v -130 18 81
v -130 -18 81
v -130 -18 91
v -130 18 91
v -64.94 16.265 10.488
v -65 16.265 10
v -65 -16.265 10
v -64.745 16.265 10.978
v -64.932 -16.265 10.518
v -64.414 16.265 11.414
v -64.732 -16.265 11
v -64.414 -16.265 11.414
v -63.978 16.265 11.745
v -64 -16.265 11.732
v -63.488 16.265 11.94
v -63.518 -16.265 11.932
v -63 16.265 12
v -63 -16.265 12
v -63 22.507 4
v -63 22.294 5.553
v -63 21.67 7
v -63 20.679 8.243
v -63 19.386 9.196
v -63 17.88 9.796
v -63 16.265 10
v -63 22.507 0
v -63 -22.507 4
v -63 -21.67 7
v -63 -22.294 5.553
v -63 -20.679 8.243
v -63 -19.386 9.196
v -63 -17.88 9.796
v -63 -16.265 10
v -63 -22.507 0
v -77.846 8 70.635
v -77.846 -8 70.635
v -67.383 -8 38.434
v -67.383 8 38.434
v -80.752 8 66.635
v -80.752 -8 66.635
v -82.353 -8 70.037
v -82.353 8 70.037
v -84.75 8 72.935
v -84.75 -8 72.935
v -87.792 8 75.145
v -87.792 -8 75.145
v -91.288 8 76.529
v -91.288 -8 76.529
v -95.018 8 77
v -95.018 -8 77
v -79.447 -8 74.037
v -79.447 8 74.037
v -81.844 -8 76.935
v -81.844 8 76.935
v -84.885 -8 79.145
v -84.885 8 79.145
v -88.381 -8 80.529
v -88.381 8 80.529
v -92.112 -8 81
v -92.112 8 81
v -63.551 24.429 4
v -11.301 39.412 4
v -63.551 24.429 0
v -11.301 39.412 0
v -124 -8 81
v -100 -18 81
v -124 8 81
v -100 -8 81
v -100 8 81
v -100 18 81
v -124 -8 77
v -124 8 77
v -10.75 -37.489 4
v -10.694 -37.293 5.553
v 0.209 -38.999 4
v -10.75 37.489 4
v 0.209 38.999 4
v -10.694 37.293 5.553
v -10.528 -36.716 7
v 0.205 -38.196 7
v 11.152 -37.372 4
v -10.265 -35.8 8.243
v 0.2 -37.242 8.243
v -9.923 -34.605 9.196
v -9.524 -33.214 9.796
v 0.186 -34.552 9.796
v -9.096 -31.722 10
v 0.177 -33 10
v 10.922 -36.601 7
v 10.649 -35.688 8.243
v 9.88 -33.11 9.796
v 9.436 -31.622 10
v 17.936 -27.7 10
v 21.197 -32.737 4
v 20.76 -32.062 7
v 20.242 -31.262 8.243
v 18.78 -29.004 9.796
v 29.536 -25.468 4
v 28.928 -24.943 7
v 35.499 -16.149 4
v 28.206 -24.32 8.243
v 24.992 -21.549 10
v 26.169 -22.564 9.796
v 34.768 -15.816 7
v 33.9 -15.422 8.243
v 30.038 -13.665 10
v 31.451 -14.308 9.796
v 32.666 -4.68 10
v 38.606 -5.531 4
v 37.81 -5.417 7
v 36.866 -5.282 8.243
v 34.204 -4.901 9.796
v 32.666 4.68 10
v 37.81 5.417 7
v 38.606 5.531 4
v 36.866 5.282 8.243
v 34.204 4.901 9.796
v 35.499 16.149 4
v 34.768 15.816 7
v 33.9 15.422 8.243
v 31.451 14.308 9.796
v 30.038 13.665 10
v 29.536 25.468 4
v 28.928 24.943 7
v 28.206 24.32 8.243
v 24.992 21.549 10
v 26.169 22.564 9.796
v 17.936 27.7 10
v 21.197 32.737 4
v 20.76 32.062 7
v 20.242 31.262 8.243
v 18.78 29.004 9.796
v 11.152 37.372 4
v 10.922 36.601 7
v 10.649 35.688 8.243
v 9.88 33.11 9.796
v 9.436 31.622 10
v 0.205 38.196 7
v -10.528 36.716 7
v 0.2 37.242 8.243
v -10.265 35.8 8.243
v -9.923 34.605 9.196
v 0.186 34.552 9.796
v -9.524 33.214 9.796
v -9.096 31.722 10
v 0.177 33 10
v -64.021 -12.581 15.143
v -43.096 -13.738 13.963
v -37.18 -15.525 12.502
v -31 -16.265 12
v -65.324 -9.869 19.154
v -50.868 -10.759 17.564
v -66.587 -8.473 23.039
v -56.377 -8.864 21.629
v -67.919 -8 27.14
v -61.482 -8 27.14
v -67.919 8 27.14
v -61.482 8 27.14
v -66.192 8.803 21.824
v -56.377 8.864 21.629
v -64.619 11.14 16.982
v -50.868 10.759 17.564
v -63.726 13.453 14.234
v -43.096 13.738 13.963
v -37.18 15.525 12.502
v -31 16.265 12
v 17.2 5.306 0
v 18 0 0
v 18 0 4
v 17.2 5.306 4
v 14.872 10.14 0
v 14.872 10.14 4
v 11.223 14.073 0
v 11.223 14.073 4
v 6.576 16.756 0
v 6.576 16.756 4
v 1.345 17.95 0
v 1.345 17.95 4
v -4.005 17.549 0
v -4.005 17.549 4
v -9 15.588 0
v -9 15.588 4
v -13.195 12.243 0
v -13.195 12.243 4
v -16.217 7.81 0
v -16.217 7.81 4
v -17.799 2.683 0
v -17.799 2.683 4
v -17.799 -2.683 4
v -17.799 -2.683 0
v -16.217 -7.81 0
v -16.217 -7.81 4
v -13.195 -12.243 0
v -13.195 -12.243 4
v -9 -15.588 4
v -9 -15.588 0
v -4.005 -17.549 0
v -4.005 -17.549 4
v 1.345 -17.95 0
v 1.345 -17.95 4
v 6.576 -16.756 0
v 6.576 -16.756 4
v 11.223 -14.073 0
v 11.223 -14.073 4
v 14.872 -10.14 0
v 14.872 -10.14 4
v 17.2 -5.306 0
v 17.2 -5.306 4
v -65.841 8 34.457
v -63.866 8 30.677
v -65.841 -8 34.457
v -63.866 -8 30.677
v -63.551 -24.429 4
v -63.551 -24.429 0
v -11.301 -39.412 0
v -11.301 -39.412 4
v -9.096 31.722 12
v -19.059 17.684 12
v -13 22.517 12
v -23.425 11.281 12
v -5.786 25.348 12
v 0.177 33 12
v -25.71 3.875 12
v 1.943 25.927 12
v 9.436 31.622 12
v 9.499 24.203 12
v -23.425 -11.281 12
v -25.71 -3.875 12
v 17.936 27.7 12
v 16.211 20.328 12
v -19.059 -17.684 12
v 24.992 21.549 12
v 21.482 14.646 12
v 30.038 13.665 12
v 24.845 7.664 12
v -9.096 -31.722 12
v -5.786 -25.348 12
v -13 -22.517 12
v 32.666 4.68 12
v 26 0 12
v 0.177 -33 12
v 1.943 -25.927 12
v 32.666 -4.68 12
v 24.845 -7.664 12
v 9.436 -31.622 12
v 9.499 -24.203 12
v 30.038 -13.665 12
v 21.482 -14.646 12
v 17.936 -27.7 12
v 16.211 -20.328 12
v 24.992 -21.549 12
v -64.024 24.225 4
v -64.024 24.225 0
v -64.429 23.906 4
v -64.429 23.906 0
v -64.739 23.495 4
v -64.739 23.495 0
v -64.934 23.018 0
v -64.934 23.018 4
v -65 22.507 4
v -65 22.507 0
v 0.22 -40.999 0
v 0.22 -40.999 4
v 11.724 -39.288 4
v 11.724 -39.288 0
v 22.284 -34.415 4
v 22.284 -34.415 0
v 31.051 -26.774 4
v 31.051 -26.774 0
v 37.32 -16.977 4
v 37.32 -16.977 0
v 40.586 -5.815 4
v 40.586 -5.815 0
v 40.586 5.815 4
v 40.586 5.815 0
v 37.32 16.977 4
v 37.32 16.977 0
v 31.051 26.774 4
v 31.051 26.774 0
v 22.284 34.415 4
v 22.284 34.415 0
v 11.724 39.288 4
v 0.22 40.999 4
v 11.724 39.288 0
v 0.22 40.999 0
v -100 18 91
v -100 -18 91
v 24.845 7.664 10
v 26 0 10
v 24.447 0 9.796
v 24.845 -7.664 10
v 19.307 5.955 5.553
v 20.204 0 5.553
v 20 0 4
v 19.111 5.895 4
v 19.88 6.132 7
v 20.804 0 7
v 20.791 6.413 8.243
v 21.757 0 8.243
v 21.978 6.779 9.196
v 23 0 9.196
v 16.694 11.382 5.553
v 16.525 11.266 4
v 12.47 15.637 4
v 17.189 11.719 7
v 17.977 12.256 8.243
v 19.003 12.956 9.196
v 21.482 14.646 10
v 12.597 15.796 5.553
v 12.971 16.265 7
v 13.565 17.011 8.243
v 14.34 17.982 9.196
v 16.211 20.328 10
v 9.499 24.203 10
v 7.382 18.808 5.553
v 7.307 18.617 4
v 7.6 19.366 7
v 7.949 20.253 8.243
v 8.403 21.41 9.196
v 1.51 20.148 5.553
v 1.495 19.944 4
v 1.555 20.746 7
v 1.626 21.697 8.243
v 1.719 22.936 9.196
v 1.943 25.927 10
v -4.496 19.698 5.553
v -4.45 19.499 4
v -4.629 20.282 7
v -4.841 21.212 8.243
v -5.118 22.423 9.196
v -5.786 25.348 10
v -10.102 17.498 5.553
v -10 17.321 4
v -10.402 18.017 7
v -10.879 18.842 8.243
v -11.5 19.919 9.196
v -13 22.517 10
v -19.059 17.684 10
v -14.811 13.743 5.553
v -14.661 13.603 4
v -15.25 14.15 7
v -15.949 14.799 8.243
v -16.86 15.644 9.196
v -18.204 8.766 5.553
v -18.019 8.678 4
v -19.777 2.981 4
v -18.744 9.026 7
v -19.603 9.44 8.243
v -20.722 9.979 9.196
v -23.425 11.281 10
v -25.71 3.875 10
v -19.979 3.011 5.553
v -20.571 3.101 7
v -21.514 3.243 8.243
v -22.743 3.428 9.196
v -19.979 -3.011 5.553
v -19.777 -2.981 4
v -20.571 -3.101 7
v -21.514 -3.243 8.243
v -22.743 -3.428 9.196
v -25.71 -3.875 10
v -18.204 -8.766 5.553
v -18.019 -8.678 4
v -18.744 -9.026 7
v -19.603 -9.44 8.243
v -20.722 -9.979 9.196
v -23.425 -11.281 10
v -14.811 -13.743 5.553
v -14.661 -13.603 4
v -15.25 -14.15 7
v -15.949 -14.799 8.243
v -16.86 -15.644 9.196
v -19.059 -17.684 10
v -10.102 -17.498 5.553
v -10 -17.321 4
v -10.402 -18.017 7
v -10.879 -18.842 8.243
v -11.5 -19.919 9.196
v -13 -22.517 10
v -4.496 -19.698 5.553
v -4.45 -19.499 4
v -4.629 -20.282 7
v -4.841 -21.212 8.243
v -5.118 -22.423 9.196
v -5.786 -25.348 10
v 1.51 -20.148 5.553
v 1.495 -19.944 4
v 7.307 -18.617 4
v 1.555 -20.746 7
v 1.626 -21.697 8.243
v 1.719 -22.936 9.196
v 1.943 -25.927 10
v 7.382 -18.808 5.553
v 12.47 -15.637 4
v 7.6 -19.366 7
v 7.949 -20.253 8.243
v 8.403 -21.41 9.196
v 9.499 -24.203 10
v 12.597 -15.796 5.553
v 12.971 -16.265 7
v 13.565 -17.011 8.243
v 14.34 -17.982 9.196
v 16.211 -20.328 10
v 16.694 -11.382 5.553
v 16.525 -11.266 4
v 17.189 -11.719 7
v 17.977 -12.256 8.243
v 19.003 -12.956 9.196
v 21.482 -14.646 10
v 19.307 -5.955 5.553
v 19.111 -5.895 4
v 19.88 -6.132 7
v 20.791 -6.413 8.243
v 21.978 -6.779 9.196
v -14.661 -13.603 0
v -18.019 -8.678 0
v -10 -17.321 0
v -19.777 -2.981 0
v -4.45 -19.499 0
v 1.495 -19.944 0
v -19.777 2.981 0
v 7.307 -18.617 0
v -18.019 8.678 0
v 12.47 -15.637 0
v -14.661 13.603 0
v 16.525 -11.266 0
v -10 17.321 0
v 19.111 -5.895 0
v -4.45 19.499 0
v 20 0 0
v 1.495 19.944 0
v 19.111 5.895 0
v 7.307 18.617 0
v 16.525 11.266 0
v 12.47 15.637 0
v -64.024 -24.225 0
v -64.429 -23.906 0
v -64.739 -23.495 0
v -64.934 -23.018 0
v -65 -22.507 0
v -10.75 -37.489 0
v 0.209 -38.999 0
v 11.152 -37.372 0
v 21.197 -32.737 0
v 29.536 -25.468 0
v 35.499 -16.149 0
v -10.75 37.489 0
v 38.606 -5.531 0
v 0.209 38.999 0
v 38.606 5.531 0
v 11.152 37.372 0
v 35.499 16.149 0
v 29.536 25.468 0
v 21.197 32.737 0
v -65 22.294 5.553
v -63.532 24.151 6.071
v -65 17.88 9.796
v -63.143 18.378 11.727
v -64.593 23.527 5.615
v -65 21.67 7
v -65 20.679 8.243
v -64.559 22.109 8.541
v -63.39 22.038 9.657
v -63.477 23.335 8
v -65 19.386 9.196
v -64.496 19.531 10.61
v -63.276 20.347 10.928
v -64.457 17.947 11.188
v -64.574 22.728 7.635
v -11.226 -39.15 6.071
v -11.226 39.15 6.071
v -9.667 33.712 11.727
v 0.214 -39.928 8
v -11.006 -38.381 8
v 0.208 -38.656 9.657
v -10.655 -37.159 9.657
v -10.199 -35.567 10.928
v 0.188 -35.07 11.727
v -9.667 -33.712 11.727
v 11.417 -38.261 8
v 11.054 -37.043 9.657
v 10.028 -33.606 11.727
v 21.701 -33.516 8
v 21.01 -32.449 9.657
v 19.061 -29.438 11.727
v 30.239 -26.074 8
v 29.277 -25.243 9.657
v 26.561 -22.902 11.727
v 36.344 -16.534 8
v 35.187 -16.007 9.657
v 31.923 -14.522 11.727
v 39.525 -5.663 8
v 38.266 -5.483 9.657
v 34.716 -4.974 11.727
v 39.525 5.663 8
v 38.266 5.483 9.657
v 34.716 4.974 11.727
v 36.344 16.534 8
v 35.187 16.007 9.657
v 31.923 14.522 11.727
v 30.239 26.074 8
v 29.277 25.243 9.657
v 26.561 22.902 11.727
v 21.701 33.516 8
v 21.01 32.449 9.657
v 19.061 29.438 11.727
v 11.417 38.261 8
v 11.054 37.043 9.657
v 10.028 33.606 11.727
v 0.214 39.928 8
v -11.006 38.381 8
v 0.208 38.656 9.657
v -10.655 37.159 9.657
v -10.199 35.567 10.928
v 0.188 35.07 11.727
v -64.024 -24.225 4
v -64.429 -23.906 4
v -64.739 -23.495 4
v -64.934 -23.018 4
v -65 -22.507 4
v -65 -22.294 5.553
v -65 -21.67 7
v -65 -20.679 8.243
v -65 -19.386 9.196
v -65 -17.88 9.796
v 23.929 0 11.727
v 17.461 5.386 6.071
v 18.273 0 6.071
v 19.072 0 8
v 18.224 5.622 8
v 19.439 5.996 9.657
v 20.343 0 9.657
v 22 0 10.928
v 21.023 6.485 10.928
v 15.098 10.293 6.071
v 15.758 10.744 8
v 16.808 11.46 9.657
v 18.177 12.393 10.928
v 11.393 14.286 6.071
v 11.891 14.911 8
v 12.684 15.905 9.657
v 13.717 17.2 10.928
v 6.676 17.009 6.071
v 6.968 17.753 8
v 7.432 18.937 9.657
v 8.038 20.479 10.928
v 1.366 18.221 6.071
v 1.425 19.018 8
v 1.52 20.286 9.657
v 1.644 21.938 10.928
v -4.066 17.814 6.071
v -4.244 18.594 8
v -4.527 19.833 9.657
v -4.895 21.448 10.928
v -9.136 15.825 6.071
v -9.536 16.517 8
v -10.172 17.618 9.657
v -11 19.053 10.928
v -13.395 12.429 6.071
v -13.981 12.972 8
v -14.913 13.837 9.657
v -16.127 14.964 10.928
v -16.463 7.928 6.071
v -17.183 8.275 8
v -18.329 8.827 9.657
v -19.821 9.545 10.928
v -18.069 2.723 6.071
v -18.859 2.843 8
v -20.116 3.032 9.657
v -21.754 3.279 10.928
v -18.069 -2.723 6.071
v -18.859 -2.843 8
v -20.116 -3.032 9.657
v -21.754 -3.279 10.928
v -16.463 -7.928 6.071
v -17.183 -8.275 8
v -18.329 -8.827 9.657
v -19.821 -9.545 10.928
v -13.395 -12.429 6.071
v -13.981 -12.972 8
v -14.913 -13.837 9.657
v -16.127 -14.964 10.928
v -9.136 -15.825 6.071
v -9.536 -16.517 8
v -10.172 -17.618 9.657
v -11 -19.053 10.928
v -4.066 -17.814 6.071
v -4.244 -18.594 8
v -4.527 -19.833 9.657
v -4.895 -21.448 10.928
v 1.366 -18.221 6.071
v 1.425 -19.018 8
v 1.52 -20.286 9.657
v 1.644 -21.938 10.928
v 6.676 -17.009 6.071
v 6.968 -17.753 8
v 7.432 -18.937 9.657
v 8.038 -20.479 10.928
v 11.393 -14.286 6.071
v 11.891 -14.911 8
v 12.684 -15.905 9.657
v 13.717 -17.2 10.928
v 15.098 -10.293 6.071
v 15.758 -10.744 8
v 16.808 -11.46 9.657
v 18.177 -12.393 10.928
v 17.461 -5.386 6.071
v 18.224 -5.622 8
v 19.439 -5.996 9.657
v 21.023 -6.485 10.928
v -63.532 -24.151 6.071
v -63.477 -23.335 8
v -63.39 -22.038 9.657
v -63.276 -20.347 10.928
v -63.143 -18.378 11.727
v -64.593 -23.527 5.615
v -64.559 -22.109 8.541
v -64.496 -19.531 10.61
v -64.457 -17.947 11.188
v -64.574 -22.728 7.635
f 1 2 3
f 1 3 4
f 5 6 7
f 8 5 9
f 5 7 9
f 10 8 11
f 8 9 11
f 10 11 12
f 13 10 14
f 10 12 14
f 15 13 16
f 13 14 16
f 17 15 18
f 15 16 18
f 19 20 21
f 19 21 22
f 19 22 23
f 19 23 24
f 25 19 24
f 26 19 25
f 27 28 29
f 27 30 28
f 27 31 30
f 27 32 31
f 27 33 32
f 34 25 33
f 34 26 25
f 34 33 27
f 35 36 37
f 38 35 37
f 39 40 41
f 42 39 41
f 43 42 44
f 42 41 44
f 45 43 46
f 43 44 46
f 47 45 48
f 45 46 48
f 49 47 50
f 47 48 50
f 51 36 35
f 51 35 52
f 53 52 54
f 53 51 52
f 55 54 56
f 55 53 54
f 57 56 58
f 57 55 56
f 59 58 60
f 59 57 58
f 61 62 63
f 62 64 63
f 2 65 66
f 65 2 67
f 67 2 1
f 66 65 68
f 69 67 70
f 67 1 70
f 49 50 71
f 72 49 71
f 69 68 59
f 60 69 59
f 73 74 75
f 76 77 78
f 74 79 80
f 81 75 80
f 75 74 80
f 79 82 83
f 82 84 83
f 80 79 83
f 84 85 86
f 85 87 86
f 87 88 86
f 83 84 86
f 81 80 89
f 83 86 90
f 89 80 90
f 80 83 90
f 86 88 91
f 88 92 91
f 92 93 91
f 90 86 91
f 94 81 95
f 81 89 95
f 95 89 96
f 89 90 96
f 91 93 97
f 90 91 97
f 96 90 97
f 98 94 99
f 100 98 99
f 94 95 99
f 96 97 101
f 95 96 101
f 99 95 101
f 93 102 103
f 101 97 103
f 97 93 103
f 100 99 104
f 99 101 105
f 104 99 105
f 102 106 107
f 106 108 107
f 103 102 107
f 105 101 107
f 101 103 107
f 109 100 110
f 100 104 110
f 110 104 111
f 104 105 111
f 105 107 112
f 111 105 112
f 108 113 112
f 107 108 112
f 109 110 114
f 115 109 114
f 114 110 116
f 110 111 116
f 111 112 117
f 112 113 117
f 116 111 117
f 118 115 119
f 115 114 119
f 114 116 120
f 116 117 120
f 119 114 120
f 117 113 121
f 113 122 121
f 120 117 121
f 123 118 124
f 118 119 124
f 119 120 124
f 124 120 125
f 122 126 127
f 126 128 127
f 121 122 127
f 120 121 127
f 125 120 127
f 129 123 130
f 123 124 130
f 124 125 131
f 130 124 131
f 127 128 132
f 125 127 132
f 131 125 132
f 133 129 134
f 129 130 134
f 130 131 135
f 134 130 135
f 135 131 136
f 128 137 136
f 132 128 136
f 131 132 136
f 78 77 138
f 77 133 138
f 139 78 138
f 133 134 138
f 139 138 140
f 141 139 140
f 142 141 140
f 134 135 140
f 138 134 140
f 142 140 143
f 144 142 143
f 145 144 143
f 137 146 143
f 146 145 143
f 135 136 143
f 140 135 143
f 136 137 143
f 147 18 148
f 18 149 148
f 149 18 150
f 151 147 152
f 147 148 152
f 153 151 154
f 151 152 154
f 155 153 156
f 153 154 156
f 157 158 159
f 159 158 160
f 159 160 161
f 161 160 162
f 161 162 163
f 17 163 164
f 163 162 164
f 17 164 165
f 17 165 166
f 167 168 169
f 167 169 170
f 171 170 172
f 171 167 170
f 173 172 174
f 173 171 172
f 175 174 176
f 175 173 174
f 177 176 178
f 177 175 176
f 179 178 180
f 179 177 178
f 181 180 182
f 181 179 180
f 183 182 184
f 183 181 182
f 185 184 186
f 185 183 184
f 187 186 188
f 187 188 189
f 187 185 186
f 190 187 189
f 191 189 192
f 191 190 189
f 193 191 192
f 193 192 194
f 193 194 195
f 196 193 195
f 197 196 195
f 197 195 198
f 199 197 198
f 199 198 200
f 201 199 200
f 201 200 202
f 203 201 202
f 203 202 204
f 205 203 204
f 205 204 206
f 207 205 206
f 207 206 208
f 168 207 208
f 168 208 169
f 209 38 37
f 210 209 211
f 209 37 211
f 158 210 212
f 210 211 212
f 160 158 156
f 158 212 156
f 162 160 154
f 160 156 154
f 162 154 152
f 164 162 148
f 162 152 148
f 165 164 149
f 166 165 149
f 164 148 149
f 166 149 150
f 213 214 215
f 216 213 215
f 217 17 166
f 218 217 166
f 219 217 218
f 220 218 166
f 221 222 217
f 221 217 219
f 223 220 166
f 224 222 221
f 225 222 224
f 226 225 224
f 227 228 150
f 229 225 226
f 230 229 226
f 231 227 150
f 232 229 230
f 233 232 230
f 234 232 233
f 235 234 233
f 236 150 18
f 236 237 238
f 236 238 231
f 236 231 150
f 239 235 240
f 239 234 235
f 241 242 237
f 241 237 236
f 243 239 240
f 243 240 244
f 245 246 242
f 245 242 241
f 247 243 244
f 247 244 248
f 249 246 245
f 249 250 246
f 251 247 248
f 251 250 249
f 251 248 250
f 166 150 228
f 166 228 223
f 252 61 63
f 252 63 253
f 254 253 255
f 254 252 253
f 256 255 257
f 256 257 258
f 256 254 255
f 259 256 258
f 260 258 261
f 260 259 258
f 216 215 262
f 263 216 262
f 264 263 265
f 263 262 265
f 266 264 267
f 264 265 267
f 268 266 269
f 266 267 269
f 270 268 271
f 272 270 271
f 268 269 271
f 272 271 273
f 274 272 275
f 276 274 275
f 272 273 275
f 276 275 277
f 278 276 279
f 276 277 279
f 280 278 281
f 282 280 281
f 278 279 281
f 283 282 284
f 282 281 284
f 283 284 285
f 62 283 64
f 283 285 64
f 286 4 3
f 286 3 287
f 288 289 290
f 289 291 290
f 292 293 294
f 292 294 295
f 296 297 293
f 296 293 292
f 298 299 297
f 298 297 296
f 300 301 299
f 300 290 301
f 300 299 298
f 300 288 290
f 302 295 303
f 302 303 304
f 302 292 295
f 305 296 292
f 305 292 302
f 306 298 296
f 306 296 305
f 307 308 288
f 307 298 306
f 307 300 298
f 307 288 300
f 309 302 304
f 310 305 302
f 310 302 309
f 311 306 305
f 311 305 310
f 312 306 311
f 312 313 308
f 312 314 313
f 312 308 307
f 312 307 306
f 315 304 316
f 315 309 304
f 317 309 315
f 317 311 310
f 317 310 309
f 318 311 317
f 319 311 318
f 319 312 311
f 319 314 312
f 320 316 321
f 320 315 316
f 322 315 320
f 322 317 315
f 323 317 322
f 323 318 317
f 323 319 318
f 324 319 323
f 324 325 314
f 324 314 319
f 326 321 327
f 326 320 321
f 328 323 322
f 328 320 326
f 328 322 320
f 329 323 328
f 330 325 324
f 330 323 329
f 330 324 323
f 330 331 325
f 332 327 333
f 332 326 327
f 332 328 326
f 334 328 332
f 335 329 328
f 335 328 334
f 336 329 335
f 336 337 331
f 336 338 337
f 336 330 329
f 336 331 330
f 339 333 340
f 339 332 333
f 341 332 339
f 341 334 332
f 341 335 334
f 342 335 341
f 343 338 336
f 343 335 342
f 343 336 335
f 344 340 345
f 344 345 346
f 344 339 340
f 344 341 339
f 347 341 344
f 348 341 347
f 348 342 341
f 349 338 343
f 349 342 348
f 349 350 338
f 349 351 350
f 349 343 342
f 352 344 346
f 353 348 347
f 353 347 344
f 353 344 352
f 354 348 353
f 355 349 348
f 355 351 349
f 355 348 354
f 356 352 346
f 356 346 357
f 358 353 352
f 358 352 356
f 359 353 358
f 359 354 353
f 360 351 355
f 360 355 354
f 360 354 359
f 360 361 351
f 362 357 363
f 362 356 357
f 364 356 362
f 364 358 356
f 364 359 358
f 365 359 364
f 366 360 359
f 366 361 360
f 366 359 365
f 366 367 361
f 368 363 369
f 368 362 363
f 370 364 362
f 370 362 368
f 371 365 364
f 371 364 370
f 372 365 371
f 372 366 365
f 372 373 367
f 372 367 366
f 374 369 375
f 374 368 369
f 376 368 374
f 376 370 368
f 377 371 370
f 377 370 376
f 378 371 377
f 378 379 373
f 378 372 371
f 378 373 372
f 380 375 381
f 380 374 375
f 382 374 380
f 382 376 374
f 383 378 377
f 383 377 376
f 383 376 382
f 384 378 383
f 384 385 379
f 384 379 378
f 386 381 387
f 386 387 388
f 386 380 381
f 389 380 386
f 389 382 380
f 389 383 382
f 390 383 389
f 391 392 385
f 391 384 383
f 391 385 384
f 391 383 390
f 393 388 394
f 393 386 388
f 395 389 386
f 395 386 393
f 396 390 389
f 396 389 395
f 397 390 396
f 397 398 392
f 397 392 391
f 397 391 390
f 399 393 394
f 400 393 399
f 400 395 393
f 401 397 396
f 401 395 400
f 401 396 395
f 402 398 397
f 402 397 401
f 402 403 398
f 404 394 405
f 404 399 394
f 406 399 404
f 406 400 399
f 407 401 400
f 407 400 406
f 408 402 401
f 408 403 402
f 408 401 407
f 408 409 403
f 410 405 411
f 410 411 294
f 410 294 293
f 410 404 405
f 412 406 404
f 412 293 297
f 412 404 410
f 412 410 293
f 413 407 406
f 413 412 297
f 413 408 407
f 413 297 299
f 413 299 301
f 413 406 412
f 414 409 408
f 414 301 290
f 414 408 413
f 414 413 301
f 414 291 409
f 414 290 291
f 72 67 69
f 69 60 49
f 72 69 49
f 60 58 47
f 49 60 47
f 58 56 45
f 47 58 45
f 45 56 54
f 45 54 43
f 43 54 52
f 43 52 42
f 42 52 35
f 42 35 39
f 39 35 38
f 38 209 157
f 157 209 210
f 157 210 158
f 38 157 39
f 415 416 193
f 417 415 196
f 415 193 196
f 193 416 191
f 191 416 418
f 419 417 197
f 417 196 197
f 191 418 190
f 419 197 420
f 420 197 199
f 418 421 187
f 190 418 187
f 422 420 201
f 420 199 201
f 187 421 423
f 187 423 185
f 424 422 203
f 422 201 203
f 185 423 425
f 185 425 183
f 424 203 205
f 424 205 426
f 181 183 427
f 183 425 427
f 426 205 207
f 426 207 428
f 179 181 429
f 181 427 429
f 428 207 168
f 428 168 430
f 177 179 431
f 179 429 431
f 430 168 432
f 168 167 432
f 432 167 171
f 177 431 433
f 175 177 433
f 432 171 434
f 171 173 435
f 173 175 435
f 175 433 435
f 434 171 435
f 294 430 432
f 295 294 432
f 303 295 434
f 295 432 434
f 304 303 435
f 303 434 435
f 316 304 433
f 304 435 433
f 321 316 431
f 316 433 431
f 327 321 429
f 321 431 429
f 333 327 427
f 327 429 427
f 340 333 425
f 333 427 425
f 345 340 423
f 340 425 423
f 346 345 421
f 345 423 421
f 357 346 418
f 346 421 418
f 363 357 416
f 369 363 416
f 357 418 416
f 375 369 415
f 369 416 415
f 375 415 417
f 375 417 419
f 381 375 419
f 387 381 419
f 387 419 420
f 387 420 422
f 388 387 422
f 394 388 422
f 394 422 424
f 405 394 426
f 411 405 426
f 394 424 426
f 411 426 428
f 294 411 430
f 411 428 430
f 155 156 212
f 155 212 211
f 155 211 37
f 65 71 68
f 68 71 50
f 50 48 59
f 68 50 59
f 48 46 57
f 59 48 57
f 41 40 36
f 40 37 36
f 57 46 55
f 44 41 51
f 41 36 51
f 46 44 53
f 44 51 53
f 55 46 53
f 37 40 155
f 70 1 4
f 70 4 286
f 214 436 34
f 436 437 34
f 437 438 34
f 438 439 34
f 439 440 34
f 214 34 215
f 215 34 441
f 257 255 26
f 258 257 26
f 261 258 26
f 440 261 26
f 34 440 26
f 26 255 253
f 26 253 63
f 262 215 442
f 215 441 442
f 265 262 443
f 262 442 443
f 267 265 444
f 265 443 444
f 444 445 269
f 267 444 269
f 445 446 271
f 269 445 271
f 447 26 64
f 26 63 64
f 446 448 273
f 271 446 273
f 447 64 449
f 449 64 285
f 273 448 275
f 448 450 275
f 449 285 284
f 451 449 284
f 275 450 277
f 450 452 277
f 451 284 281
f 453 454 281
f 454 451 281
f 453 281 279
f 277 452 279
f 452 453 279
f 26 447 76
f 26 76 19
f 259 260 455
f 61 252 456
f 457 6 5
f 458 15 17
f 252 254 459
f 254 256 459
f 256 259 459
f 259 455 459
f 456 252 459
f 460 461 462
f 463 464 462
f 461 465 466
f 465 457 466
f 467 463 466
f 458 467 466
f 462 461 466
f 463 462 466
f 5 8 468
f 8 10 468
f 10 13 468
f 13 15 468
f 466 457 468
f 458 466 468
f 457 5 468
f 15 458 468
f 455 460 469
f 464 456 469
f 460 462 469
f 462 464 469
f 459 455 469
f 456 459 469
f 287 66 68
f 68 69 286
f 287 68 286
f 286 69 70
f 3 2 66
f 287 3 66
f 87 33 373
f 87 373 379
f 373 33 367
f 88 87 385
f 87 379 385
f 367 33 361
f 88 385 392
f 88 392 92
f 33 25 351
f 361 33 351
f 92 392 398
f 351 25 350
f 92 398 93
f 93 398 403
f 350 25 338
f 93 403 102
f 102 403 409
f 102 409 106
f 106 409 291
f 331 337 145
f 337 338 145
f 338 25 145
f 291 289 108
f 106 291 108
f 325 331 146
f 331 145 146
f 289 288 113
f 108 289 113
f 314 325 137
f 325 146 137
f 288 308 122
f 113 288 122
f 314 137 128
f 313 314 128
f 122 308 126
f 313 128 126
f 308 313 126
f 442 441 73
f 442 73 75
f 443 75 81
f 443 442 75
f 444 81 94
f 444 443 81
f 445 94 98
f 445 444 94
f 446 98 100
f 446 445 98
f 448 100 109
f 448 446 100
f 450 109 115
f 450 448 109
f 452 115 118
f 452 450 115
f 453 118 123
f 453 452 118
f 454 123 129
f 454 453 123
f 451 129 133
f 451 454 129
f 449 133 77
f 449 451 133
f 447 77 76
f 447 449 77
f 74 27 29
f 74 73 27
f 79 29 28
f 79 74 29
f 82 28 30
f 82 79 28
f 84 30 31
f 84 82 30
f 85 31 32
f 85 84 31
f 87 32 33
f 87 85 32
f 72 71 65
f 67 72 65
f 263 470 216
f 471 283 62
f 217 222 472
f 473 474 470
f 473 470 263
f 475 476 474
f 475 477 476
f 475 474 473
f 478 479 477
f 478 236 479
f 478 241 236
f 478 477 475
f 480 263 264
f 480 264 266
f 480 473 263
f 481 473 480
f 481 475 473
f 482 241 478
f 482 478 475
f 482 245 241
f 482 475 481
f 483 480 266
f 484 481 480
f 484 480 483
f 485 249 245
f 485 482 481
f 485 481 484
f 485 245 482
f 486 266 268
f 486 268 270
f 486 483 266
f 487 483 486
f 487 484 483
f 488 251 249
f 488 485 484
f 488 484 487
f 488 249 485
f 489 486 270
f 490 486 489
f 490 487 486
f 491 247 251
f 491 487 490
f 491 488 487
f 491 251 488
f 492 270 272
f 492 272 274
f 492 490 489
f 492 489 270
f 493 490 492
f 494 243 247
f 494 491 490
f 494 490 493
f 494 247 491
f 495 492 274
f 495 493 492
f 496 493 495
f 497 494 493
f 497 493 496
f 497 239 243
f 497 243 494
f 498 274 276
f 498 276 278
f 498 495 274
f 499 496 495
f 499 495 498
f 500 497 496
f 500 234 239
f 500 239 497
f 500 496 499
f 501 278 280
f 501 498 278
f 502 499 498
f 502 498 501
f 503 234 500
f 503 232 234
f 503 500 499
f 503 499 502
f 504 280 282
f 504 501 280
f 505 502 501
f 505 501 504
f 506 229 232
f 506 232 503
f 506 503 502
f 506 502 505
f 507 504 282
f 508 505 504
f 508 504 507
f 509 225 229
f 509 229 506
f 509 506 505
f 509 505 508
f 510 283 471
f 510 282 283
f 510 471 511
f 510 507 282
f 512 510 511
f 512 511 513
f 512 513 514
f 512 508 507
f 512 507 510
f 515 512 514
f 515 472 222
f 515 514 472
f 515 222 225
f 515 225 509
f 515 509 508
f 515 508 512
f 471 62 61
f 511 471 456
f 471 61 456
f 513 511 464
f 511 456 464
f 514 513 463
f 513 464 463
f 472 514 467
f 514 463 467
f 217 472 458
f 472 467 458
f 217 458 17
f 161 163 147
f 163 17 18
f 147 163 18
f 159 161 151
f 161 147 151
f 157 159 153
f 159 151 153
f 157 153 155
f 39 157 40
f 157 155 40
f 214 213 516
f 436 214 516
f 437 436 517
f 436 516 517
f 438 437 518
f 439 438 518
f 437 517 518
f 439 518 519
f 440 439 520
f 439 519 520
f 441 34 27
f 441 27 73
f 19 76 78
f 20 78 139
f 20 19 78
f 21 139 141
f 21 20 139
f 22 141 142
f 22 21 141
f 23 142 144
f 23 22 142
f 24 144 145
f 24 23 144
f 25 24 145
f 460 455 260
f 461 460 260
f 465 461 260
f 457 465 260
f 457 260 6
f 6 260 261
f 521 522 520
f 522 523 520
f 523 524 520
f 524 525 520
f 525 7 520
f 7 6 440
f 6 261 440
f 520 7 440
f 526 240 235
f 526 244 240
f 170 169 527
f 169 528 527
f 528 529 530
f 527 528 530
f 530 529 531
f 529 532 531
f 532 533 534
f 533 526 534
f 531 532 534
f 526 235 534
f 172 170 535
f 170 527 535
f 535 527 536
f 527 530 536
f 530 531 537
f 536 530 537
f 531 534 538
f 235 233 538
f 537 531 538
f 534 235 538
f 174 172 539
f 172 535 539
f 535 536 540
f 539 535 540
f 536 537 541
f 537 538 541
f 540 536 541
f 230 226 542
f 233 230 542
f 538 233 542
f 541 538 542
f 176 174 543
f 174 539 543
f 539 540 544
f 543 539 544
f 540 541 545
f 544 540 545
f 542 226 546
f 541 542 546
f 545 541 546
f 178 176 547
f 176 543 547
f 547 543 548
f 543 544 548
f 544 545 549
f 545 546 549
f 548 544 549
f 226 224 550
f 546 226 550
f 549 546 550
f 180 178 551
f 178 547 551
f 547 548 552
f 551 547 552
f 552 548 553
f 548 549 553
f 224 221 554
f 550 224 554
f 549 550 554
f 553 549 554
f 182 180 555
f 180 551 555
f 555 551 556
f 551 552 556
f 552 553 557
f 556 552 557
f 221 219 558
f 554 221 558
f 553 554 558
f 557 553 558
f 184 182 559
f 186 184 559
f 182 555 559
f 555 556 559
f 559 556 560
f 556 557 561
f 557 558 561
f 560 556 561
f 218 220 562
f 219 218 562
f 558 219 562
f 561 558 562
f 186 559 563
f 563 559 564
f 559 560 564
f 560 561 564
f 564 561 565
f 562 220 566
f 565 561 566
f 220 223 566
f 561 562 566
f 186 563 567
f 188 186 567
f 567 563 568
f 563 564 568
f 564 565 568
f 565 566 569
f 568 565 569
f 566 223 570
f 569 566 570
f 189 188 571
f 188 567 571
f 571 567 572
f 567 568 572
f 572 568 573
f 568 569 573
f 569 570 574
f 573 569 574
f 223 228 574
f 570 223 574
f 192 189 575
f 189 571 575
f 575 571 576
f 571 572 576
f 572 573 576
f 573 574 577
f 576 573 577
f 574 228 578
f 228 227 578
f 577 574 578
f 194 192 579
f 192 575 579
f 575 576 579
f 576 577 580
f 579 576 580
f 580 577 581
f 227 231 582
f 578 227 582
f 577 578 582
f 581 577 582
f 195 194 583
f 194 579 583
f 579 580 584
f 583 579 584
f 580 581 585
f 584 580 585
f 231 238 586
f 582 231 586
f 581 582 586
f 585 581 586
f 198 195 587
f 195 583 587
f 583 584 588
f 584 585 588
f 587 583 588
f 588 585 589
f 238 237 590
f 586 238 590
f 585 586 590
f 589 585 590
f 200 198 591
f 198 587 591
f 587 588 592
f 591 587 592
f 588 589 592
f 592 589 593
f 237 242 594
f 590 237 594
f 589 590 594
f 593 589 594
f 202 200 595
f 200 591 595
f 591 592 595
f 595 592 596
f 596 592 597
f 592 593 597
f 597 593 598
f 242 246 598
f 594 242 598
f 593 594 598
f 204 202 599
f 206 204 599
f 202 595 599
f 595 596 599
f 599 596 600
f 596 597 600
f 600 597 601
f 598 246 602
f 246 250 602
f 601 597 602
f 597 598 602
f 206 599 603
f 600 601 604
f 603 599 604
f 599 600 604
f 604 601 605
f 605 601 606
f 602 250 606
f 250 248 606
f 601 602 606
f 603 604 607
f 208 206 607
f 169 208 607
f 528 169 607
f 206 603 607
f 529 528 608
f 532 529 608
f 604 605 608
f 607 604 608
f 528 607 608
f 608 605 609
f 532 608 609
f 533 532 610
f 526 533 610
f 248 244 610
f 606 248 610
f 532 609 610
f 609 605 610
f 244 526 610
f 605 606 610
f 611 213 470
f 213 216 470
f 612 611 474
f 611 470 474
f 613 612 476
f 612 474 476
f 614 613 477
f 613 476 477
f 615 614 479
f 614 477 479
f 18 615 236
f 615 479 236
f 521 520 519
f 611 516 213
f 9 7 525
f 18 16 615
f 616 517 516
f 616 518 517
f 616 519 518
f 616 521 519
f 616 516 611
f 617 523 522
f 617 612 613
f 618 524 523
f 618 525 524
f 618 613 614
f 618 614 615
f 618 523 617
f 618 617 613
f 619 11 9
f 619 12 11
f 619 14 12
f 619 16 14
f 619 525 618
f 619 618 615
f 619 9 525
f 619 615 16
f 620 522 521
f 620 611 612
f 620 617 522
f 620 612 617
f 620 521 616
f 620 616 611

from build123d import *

# Parameters (mm, degrees)
SKETCH_R     = 20
PAD_DEPTH    = 10
FILLET_R     = 6
THICKNESS_T  = 2
PAD001_DEPTH = 20
POCKET_DEPTH = 124.001
SKETCH003_W  = 30
SKETCH003_H  = 36
PAD002_DEPTH = 10


with BuildPart() as part:
    # Sketch → Pad (new body)
    with BuildSketch(Plane.XY):
        with BuildLine():
            ThreePointArc((-10.749857, -37.489206), (39, 0), (-10.749857, 37.489206))
            Line((-10.749857, 37.489206), (-63, 22.506719))
            Line((-63, 22.506719), (-63, -22.506719))
            Line((-63, -22.506719), (-10.749857, -37.489206))
        make_face()
        Circle(SKETCH_R, mode=Mode.SUBTRACT)
    extrude(amount=PAD_DEPTH)

    # Fillet
    fillet_edges = [part.edges().sort_by_distance(p)[0] for p in [
        (-36.874928, -29.997962, 10),
        (39, 0, 10),
        (-36.874928, 29.997962, 10),
        (-20, 0, 10),
    ]]
    fillet(fillet_edges, radius=FILLET_R)

    # Thickness
    thickness_openings = [part.faces().sort_by_distance(p)[0] for p in [
        (-14.455542, 0, 0),
    ]]
    offset(amount=THICKNESS_T, openings=thickness_openings)

    # Sketch001 → Pad001 (join, symmetric)
    with BuildSketch(Plane.XZ):
        with BuildLine():
            Line((-63, 12), (-80.75207, 66.635255))
            ThreePointArc((-80.75207, 66.635255), (-86.201139, 74.135255), (-95.017918, 77))
            Line((-95.017918, 77), (-124, 77))
            Line((-124, 77), (-124, 81))
            Line((-124, 81), (-92.111748, 81))
            ThreePointArc((-77.8459, 70.635255), (-83.294969, 78.135255), (-92.111748, 81))
            Line((-77.8459, 70.635255), (-67.383016, 38.433809))
            ThreePointArc((-67.383016, 38.433809), (-53.485941, 19.306125), (-31, 12))
            Line((-63, 12), (-31, 12))
        make_face()
    extrude(amount=PAD001_DEPTH, both=True)

    # Sketch002 → Pocket (cut, through all)
    with BuildSketch(Plane.YZ):
        with BuildLine():
            Line((8, 94.265679), (8, 27.140286))
            ThreePointArc((8, 27.140286), (10.200769, 18.515653), (16.264922, 12))
            Line((16.264922, 12), (86.307831, 12))
            Line((86.307831, 124.281616), (86.307831, 12))
            Line((-95.791176, 124.281616), (86.307831, 124.281616))
            Line((-95.791176, 12), (-95.791176, 124.281616))
            Line((-16.264922, 12), (-95.791176, 12))
            ThreePointArc((-16.264922, 12), (-10.200769, 18.515653), (-8, 27.140286))
            Line((-8, 27.140286), (-8, 94.265679))
            Line((-8, 94.265679), (8, 94.265679))
        make_face()
    extrude(amount=-POCKET_DEPTH, mode=Mode.SUBTRACT)

    # Sketch003 (on Face43 of Pocket) → Pad002 (join)
    with BuildSketch(Plane.XY.offset(81)):
        with Locations((-115, 0)):
            Rectangle(SKETCH003_W, SKETCH003_H)
    extrude(amount=PAD002_DEPTH)


solid = part.part
